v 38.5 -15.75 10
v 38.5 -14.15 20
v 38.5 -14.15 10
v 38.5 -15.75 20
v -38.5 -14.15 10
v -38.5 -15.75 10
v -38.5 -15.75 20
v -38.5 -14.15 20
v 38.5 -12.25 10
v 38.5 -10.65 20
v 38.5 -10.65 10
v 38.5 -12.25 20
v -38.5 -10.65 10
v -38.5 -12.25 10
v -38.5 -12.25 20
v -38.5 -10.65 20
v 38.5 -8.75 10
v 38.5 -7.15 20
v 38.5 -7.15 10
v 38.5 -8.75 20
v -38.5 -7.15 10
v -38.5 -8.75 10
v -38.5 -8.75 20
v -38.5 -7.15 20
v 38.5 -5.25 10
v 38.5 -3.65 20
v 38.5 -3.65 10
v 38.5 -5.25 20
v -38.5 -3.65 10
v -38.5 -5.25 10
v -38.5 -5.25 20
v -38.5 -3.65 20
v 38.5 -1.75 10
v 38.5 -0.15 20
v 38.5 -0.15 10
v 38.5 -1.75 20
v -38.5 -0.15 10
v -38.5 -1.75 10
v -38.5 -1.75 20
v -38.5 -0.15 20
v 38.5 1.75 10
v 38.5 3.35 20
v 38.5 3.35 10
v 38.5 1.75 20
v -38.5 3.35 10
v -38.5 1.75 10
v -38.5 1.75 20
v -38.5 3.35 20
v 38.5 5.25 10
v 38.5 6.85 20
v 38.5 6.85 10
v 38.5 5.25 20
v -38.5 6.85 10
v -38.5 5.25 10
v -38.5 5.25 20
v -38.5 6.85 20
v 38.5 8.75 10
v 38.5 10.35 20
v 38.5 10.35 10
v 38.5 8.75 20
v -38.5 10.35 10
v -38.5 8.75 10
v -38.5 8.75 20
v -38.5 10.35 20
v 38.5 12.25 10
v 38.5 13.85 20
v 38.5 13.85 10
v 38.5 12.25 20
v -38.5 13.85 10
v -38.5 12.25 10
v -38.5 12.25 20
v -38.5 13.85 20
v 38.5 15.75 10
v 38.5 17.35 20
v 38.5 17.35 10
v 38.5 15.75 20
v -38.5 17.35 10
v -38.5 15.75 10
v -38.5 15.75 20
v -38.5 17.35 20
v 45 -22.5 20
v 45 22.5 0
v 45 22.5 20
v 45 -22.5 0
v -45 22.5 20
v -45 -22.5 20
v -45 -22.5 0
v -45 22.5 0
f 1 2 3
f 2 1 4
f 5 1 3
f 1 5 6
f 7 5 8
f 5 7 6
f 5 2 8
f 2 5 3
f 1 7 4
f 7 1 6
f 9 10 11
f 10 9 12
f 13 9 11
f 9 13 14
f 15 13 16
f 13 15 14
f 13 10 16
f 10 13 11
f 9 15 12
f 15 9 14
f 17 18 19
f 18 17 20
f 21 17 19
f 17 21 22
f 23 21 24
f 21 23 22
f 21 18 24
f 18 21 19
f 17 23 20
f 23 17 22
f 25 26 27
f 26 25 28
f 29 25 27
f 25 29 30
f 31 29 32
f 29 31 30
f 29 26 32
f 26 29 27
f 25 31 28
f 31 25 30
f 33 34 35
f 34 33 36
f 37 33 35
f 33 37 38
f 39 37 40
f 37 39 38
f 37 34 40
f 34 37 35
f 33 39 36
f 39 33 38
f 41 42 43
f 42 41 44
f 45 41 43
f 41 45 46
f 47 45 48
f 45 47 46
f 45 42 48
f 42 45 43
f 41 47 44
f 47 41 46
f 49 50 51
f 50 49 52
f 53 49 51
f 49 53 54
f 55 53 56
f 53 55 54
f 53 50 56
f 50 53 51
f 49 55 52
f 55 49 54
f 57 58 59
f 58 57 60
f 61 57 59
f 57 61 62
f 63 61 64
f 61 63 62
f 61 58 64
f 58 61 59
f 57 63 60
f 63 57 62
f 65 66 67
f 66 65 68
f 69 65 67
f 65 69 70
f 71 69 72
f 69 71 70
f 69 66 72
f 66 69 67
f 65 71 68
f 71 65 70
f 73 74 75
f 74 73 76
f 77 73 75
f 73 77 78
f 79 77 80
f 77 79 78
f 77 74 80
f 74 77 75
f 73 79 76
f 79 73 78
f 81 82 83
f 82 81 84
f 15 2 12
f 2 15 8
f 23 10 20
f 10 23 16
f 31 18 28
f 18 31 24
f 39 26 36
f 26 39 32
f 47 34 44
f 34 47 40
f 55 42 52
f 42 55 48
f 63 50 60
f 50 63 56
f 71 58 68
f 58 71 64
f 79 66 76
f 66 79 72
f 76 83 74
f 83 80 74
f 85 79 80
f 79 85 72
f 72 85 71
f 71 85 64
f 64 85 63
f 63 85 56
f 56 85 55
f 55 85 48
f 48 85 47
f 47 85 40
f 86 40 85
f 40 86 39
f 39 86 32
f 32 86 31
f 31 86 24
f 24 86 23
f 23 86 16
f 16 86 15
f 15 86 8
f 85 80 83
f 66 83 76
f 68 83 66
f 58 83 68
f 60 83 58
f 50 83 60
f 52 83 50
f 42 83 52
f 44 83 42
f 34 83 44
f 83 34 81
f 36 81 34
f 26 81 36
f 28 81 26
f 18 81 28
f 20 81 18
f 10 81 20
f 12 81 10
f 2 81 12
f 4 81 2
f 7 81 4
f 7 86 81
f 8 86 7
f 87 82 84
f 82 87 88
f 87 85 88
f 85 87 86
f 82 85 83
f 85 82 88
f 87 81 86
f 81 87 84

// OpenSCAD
// Microscope slide drying rack
// Units: mm. Print orientation: base on XY plane, builds up +Z.

// ---- Block ----
block_len   = 90;    // block length along X
block_wid   = 45;    // block width along Y
block_ht    = 20;    // block height along Z

// ---- Slots ----
slot_count  = 10;    // number of slide slots
slot_len    = 77;    // slot length along X (75 mm slide + clearance)
slot_w      = 1.6;   // slot width along Y
slot_depth  = 10;    // slot depth from top face
slot_pitch  = 3.5;   // centre-to-centre spacing along Y

// ---- Misc ----
eps         = 0.5;   // overshoot for clean boolean cuts
$fn         = 64;

difference() {
    // Base block, centred in X and Y
    translate([-block_len/2, -block_wid/2, 0])
        cube([block_len, block_wid, block_ht]);

    // Slot group, centred on the block in X and Y
    for (i = [0 : slot_count - 1]) {
        y = (i - (slot_count - 1)/2) * slot_pitch;
        translate([-slot_len/2, y, block_ht - slot_depth])
            cube([slot_len, slot_w, slot_depth + eps]);
    }
}
